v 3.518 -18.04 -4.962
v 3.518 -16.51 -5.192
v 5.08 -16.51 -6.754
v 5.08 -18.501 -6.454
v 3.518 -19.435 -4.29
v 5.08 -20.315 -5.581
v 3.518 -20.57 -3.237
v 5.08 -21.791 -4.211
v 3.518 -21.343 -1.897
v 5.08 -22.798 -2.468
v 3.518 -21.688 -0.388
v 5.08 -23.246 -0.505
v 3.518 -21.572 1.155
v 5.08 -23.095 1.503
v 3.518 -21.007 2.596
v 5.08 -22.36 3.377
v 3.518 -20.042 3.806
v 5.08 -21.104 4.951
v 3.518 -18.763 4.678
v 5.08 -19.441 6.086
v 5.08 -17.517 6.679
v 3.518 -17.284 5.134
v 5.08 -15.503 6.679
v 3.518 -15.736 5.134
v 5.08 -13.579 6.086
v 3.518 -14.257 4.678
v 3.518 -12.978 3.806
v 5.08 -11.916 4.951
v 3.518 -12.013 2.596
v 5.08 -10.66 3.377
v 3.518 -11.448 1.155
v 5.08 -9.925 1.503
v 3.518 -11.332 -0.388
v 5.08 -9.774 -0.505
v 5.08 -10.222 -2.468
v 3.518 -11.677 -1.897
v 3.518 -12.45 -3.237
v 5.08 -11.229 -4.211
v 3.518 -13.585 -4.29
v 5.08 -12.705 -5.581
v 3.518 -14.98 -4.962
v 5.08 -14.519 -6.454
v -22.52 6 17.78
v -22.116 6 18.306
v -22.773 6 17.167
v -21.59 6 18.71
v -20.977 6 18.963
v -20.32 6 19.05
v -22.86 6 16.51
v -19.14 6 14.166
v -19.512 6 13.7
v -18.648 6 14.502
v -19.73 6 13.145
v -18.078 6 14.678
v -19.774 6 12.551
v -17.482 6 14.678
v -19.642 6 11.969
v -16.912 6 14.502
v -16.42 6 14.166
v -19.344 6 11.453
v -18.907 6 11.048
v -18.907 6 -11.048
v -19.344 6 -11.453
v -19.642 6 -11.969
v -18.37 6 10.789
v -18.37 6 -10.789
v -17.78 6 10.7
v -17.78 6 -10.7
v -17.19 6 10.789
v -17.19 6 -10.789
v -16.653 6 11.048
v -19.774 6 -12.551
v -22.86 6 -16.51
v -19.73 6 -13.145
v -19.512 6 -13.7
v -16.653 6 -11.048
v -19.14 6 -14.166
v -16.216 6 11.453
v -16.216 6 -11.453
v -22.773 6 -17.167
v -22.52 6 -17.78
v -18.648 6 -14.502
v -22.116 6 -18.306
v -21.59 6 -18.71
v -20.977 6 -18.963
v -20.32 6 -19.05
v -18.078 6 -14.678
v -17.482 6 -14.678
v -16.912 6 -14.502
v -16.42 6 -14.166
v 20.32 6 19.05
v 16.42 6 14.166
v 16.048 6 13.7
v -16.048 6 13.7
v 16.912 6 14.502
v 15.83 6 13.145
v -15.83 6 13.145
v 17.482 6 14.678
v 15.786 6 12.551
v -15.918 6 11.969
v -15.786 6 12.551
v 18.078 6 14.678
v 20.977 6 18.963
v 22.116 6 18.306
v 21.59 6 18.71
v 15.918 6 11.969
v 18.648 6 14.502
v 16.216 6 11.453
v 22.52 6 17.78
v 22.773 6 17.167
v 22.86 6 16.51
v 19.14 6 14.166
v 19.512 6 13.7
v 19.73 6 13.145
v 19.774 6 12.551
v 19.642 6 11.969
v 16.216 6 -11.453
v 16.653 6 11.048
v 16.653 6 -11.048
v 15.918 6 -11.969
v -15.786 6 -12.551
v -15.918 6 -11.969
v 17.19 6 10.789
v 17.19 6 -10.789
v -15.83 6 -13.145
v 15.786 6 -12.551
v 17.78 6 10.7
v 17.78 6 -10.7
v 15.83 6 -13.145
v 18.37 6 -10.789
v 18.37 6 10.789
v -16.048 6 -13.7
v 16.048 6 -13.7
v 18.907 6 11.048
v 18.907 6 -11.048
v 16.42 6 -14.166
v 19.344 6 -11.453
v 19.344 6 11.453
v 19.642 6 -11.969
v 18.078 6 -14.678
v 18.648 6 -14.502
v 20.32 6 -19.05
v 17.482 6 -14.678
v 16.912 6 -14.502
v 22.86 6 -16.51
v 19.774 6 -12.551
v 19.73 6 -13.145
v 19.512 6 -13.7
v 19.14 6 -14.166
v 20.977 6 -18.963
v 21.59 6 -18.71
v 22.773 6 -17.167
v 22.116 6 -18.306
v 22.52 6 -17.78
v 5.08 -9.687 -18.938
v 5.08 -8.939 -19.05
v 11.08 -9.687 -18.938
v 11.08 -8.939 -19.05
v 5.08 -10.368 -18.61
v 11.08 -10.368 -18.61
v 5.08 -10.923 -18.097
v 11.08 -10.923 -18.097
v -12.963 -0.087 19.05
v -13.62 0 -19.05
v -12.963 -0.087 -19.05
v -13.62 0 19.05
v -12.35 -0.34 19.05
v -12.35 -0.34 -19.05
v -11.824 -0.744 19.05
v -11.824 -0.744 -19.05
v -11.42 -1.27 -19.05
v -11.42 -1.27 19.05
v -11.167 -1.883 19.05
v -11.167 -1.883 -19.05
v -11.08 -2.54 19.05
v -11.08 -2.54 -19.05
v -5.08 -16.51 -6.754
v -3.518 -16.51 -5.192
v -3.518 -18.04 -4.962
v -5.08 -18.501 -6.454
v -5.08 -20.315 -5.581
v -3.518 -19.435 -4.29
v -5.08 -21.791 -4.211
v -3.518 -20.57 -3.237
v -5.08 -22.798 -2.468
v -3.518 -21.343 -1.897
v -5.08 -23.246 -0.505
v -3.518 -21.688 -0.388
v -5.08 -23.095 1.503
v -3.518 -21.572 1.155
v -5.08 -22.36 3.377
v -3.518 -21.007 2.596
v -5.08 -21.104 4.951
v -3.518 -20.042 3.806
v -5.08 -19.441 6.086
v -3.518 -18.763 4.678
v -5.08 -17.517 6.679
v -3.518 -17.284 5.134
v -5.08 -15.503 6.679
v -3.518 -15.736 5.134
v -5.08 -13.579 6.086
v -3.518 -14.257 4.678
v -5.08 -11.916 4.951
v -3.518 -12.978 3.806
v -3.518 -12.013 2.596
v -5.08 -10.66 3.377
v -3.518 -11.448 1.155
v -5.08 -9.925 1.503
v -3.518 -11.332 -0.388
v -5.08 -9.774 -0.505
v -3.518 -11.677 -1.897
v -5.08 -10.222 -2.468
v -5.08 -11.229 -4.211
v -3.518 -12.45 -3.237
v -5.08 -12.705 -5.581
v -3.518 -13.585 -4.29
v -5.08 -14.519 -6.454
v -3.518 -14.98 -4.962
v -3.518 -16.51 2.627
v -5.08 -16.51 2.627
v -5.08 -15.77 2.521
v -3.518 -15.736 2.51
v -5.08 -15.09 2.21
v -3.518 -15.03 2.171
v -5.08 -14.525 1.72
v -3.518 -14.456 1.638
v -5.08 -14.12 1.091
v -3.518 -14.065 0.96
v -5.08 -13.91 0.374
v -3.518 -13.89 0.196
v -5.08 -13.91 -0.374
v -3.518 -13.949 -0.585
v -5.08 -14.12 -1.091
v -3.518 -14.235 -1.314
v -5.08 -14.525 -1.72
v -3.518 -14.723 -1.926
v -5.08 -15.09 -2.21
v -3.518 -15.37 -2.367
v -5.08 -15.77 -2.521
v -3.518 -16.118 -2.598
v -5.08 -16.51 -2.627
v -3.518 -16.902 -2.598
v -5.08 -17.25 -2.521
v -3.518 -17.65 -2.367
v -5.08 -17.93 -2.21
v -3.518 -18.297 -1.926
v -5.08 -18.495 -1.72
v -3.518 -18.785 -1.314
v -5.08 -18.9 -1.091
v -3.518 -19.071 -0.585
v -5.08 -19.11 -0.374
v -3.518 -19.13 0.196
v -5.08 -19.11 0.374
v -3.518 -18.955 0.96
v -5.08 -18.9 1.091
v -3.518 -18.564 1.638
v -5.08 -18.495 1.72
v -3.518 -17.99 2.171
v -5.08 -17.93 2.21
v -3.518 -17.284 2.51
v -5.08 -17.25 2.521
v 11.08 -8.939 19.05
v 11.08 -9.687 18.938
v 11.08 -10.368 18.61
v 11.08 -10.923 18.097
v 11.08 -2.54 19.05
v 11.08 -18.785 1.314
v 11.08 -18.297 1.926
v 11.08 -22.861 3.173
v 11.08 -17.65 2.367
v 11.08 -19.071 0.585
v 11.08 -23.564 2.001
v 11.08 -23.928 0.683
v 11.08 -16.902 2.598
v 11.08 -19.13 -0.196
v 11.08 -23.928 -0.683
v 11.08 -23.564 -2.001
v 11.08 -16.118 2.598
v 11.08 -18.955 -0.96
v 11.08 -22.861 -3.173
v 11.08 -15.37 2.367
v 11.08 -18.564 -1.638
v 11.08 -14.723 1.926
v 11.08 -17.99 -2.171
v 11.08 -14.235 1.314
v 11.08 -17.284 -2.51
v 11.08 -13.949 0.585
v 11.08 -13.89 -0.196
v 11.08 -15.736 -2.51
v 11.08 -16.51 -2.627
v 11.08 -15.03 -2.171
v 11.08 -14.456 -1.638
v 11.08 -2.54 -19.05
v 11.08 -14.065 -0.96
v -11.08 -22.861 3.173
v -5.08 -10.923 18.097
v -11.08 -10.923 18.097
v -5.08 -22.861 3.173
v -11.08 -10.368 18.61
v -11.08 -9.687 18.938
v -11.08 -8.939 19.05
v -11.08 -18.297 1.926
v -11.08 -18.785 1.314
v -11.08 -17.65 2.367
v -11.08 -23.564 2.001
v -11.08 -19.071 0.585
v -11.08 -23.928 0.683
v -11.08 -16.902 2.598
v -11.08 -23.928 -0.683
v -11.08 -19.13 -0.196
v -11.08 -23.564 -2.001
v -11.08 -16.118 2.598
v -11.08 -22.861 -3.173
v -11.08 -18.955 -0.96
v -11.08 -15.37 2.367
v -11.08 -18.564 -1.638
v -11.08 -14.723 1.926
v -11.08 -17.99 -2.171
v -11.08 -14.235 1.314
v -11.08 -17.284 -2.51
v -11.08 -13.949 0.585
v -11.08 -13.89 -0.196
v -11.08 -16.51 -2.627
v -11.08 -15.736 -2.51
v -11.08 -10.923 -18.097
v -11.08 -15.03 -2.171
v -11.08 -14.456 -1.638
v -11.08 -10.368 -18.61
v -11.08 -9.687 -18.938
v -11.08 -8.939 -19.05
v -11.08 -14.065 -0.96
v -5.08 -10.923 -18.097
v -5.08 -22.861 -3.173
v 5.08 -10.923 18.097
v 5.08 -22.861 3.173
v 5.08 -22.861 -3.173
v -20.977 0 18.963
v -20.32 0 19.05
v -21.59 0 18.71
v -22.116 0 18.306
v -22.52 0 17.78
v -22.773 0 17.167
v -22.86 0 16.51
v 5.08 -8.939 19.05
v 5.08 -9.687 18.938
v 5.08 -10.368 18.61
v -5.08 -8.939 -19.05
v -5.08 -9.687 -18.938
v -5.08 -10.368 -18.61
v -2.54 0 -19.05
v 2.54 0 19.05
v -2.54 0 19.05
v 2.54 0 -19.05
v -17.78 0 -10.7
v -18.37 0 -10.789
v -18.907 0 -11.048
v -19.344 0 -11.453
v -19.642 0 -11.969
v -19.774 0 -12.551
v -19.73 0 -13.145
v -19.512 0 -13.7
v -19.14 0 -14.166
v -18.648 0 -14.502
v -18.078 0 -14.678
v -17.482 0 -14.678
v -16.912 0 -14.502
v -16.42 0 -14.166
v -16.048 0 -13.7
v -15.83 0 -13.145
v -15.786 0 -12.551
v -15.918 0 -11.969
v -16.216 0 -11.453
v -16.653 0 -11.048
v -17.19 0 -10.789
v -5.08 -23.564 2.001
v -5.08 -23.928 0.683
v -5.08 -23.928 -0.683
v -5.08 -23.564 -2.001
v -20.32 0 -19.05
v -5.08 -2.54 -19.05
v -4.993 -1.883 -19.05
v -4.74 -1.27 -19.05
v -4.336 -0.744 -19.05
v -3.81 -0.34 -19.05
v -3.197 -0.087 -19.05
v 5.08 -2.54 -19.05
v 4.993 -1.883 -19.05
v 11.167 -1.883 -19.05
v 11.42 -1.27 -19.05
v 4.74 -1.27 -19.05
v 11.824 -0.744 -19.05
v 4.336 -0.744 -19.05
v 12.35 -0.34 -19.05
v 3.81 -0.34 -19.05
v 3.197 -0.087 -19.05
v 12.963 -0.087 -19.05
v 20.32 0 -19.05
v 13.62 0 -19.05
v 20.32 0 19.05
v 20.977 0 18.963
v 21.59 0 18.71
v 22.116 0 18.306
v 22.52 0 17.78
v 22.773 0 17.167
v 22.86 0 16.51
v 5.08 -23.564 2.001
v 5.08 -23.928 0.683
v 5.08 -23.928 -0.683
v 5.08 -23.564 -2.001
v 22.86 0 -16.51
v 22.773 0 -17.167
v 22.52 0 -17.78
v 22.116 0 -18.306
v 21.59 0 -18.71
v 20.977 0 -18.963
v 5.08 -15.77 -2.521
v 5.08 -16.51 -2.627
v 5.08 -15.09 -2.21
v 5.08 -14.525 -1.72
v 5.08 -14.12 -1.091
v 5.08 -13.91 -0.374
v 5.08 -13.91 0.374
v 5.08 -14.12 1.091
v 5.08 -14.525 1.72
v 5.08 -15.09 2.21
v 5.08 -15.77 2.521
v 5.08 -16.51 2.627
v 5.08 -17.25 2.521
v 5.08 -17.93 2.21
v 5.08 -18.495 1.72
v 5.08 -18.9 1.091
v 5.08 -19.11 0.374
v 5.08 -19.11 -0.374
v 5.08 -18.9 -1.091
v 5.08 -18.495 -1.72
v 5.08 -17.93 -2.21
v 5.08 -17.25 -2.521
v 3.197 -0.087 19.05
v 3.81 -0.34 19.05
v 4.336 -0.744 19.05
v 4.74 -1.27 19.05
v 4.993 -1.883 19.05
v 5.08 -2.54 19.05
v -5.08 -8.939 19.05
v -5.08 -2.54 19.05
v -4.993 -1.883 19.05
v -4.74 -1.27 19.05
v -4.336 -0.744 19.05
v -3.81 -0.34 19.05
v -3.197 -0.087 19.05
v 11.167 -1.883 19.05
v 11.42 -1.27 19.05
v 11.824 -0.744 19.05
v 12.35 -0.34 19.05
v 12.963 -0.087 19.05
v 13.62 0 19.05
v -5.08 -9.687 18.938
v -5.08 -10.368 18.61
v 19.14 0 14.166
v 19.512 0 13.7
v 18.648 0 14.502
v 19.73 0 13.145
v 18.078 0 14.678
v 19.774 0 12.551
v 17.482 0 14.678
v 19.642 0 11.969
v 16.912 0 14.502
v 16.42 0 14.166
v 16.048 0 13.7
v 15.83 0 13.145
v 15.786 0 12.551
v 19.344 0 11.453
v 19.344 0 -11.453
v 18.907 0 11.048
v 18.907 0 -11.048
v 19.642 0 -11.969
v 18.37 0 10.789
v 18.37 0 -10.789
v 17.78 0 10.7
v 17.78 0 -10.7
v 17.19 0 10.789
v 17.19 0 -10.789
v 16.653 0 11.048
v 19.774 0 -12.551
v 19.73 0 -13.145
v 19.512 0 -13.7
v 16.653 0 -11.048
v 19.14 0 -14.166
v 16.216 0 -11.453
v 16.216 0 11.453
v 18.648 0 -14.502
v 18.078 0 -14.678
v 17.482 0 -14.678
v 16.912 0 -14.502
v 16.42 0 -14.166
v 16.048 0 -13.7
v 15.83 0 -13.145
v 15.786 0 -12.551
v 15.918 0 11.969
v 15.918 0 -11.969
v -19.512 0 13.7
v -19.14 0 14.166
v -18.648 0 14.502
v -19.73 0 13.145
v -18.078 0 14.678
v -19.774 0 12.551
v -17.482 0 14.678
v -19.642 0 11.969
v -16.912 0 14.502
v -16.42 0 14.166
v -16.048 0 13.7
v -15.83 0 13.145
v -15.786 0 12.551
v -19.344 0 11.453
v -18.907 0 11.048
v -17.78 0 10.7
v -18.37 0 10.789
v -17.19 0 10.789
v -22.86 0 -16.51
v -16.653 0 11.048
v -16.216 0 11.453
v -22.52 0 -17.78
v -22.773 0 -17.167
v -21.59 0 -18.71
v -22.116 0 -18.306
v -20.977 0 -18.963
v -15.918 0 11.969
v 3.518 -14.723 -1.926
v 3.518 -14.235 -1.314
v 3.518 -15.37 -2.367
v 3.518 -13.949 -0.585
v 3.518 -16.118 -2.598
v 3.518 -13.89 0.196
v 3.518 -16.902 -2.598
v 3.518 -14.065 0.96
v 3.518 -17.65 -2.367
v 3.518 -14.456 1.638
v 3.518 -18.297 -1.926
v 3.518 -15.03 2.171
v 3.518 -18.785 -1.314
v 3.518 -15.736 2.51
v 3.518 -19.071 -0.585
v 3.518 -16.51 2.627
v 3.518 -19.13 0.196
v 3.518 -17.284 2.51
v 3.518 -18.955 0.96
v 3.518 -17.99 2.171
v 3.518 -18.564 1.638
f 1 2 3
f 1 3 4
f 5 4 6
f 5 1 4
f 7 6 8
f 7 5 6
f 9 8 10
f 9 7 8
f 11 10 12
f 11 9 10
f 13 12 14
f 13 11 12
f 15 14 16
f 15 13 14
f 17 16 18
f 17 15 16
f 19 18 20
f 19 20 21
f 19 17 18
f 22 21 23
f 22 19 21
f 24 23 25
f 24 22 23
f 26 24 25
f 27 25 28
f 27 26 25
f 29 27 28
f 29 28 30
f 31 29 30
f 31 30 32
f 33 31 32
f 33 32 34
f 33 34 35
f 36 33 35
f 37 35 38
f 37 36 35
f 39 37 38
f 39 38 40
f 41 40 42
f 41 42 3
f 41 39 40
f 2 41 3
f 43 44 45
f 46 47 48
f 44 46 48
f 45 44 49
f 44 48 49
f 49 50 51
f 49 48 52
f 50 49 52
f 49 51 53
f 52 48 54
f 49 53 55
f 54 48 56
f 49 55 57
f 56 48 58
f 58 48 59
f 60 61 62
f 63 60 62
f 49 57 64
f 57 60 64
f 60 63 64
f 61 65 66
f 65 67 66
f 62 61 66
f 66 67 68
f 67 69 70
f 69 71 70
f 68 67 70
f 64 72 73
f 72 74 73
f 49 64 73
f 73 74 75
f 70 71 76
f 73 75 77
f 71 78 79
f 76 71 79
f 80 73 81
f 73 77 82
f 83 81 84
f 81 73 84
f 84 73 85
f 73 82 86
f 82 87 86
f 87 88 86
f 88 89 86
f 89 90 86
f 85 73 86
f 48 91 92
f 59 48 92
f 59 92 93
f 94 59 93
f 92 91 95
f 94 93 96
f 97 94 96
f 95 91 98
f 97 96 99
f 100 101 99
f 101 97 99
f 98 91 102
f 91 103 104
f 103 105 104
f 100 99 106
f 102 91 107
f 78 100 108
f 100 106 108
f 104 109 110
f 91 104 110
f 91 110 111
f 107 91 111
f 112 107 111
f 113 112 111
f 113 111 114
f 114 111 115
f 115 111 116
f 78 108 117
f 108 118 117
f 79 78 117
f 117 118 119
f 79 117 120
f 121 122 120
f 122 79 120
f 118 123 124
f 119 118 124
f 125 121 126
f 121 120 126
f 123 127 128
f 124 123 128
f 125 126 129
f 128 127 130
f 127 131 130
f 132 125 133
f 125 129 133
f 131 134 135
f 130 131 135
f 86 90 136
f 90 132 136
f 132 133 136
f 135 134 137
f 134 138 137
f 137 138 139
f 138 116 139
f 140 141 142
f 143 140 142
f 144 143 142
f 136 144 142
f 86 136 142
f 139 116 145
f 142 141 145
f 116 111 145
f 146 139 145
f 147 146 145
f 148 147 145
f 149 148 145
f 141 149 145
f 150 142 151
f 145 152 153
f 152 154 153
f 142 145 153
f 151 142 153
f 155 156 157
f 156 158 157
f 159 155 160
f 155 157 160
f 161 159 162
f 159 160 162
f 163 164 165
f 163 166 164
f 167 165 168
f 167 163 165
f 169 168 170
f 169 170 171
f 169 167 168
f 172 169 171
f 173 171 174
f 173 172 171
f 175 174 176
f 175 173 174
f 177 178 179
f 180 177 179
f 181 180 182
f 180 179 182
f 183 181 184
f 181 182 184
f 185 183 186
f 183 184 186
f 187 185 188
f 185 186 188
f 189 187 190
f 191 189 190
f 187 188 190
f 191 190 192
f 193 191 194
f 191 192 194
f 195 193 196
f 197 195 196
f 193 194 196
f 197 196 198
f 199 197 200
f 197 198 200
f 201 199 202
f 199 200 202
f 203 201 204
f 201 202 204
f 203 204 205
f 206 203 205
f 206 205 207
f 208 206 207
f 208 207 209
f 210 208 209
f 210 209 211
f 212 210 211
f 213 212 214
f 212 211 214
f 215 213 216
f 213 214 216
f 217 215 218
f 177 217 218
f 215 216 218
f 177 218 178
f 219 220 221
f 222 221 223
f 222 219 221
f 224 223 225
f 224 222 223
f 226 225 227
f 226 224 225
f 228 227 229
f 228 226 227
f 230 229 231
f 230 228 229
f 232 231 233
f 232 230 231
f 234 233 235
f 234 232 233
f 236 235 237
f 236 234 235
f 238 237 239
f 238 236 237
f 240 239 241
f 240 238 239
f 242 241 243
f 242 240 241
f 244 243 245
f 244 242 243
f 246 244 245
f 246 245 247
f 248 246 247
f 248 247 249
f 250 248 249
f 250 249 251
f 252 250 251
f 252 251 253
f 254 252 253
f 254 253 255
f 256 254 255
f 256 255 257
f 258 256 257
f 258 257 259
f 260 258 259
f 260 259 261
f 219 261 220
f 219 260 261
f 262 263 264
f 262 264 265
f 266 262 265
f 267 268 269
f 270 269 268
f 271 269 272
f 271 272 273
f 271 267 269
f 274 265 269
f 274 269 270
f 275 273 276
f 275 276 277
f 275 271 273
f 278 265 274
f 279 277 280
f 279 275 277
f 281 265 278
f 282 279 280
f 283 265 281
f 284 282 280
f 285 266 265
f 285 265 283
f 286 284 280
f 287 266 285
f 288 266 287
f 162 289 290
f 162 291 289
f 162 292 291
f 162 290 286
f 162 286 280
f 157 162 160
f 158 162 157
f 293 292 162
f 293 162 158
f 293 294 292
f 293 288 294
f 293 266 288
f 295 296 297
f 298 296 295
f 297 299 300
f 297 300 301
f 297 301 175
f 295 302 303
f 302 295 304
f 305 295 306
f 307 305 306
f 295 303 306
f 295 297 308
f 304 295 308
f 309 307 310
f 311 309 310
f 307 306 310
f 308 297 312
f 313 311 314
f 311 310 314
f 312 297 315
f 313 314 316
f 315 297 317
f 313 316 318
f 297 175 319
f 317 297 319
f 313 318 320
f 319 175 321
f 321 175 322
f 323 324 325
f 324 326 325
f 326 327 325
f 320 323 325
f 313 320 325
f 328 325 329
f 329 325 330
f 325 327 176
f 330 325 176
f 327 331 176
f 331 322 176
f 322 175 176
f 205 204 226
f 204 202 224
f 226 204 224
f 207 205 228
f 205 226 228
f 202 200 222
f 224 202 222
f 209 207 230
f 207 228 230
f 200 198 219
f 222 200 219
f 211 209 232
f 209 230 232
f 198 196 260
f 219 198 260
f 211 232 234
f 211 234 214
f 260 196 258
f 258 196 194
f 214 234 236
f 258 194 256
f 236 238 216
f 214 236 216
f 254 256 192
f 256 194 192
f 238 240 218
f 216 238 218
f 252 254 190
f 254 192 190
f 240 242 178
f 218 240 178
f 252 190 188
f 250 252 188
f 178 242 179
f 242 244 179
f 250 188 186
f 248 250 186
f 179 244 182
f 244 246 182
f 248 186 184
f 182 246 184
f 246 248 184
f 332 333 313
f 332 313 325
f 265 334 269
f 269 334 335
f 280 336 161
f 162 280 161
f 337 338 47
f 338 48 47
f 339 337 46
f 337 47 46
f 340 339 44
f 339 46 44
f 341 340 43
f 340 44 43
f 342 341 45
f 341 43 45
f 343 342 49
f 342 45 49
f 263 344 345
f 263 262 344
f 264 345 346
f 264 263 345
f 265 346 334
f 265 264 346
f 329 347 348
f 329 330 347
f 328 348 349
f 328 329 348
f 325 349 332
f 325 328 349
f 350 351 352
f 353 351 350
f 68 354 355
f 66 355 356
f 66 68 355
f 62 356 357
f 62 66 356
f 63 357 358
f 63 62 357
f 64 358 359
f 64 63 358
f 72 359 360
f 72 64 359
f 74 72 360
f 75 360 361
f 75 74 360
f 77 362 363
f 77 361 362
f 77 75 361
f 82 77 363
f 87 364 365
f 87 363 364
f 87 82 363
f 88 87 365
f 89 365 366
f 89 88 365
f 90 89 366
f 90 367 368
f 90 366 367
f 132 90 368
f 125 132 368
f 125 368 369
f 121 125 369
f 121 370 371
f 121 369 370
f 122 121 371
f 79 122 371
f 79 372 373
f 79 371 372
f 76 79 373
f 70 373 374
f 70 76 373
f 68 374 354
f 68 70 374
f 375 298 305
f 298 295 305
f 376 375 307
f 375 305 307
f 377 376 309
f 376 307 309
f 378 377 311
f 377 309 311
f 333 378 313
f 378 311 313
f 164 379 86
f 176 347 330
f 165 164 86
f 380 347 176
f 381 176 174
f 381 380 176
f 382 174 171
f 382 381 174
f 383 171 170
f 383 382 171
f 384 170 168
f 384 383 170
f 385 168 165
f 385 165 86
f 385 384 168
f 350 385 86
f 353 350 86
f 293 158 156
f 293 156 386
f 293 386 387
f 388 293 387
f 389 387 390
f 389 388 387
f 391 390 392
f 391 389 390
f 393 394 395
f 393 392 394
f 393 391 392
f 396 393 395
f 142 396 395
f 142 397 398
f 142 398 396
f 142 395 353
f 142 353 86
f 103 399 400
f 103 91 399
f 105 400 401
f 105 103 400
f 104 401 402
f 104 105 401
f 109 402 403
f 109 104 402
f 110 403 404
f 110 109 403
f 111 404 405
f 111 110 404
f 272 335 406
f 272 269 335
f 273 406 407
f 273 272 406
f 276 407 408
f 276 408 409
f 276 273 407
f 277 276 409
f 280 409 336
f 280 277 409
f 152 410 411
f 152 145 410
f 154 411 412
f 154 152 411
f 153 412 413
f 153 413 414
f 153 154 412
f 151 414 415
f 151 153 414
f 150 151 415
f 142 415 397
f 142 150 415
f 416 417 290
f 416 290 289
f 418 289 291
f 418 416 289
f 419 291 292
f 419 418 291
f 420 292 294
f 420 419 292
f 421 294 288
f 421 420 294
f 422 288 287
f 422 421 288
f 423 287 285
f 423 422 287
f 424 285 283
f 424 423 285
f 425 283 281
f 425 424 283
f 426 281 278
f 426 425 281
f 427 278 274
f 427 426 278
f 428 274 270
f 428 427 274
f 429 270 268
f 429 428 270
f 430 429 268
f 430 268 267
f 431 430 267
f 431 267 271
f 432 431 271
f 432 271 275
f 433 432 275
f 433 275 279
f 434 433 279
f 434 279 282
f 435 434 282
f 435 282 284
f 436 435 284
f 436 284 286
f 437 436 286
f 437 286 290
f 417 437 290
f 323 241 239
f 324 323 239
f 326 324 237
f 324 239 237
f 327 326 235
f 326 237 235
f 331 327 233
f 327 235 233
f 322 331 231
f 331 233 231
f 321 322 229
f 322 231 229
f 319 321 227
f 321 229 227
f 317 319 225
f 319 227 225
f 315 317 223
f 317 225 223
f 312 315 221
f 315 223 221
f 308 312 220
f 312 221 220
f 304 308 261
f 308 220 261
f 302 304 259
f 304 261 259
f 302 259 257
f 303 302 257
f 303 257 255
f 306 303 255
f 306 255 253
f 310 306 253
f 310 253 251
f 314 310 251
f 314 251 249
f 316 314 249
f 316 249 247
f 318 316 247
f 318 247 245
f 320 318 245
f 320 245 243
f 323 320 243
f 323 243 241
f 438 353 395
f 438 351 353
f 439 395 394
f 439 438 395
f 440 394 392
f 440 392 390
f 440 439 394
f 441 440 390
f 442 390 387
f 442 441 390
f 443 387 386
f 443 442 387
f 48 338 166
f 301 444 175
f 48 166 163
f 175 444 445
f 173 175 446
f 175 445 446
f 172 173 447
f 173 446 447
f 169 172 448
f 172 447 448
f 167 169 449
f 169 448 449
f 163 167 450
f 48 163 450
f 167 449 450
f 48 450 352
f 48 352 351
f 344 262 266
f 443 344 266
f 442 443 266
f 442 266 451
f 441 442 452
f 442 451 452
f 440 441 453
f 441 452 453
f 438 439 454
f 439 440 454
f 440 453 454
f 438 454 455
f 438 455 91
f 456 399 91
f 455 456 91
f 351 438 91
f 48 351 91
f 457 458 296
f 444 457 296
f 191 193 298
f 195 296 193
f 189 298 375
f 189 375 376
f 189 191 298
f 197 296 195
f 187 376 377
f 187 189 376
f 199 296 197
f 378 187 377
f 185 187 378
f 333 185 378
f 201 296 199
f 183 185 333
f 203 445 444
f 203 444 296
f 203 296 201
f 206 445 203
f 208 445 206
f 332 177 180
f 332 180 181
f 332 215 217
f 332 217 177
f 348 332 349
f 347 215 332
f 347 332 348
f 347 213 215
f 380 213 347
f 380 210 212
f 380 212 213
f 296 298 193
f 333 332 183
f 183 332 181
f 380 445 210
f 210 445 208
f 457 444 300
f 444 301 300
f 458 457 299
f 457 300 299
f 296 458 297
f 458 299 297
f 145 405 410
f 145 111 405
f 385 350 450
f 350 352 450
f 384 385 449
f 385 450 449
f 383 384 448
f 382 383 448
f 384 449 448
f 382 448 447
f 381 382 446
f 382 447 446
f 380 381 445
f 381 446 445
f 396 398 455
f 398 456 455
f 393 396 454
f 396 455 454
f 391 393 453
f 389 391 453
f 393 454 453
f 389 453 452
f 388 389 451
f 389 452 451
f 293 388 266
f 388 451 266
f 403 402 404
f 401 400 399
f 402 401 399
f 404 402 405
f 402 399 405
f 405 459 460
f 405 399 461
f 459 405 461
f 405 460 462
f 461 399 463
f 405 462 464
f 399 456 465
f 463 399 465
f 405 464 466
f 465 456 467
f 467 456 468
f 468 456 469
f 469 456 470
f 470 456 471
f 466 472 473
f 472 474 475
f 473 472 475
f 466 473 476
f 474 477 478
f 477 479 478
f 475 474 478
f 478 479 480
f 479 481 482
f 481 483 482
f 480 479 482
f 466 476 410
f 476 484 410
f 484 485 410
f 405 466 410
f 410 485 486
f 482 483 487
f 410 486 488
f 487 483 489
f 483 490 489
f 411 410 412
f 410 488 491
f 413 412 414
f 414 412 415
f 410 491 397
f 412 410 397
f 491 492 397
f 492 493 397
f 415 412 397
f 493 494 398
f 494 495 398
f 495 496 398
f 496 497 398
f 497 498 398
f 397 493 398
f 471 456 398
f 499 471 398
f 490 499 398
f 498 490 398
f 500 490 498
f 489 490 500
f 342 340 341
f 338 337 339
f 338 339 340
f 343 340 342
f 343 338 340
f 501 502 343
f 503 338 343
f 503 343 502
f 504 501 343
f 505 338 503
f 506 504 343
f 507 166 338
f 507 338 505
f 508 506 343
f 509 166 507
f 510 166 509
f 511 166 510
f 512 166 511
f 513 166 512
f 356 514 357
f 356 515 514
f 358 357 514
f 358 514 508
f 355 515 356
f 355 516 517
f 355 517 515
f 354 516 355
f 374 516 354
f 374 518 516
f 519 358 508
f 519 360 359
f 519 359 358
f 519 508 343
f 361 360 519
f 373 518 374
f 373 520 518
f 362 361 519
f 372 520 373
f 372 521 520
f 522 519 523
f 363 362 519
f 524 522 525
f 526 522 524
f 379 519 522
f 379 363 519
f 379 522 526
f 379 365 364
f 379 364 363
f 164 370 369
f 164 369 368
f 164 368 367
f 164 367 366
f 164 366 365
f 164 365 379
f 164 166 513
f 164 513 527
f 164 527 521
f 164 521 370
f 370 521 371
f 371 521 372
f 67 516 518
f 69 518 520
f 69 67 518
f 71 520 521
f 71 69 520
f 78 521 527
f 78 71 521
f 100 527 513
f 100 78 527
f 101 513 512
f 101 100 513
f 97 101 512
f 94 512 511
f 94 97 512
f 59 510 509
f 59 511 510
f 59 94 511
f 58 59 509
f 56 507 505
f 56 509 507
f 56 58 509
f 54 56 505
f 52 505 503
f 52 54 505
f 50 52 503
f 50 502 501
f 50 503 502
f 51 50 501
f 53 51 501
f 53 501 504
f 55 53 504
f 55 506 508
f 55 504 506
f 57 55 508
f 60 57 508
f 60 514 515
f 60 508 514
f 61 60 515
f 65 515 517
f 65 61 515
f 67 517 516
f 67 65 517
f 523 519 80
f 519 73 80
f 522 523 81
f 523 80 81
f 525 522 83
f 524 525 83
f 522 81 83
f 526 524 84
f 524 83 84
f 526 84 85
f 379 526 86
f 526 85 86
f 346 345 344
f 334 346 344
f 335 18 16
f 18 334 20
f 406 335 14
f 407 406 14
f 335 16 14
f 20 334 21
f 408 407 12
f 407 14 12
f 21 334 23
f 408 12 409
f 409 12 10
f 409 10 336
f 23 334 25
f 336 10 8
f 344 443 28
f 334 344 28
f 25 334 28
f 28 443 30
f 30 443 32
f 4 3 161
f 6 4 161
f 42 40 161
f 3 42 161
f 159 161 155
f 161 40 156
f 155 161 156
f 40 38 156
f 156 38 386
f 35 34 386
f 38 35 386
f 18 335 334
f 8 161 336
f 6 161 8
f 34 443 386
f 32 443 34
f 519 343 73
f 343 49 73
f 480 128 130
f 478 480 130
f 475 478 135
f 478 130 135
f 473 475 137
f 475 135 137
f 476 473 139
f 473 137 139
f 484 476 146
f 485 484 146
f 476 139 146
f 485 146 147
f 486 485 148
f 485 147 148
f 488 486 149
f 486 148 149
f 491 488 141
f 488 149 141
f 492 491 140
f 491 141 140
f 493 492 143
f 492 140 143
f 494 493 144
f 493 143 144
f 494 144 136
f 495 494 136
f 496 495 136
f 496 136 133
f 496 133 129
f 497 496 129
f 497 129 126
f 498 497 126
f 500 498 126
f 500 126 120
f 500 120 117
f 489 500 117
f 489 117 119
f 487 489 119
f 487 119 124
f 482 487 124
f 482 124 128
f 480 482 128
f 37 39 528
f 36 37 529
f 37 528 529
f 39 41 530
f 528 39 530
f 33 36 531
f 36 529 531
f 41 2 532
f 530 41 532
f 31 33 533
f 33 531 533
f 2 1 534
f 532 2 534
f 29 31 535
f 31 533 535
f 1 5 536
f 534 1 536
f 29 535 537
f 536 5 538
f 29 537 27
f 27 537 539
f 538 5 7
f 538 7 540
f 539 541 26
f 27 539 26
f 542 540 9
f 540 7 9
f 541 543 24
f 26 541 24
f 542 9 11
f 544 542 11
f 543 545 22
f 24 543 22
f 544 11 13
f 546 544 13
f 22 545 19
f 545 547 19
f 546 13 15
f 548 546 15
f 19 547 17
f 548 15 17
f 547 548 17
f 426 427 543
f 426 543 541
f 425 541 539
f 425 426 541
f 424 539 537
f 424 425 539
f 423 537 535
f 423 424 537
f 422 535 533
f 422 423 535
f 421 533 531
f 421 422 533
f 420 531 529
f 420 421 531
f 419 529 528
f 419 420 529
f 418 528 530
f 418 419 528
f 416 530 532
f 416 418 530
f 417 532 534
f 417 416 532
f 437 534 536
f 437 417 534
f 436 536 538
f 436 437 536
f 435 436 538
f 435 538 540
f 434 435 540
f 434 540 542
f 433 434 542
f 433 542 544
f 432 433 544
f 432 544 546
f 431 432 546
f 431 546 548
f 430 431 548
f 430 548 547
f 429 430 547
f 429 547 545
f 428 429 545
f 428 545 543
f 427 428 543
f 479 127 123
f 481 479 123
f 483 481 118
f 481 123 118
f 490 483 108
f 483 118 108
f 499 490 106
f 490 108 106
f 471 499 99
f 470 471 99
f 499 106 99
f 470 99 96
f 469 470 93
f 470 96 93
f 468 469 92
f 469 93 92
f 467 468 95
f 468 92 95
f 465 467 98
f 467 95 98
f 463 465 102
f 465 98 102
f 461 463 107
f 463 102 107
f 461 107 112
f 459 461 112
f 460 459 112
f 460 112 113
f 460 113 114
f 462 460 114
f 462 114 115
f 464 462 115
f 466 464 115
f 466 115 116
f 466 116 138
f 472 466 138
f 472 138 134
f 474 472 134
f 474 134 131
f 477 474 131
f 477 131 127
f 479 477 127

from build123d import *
from OCP.BRepFilletAPI import BRepFilletAPI_MakeFillet

# Parameters (mm, degrees)
SKETCH1_R           = 2.627
BOSS_EXTRUDE1_DEPTH = 6
BOSS_EXTRUDE2_START = -5.08
SKETCH1_3_W         = 38.1
SKETCH1_3_H         = 5.999999938
BOSS_EXTRUDE2_DEPTH = 22.86
SKETCH3_R           = 2.000000064
CUT_EXTRUDE1_DEPTH  = 44.260167546
FILLET1_R1          = 2.54
FILLET1_R2          = 5.08
SKETCH4_R           = 4.2145
SKETCH4_R_2         = 2.627
BOSS_EXTRUDE3_DEPTH = 1.5621
BOSS_EXTRUDE4_START = 8.5979
SKETCH4_2_R         = 4.2145
SKETCH4_2_R_2       = 2.627
BOSS_EXTRUDE4_DEPTH = 1.5621
CHAMFER2_SIZE       = 2.54


with BuildPart() as part:
    # Sketch1 → Boss-Extrude1 (new body)
    with BuildSketch(Plane(origin=(5.08, 0, 0), x_dir=(0, 0, -1), z_dir=(1, 0, 0))):
        Polygon((-19.05, 0), (-19.05, -10.16), (0, -25.4), (19.05, -10.16), (19.05, 0), align=None)
        with Locations((0, -16.51)):
            Circle(SKETCH1_R, mode=Mode.SUBTRACT)
    boss_extrude1 = extrude(amount=BOSS_EXTRUDE1_DEPTH)

    # Sketch1<3> → Boss-Extrude2 (add)
    with BuildSketch(Plane(origin=(5.08, 0, 0), x_dir=(0, 0, -1), z_dir=(1, 0, 0)).offset(BOSS_EXTRUDE2_START)):
        with Locations((0, 2.999999969)):
            Rectangle(SKETCH1_3_W, SKETCH1_3_H)
    boss_extrude2 = extrude(amount=BOSS_EXTRUDE2_DEPTH)

    # Sketch3 → Cut-Extrude1 (cut, through all)
    with BuildSketch(Plane(origin=(0, 5.999999938, 0), x_dir=(1, 0, 0), z_dir=(0, 1, 0))):
        with Locations(Location((17.78, 12.7, 0), (0, 0, 270))):
            Circle(SKETCH3_R)
        with Locations(Location((17.78, -12.7, 0), (0, 0, 90))):
            Circle(SKETCH3_R)
    cut_extrude1 = extrude(amount=-CUT_EXTRUDE1_DEPTH, mode=Mode.SUBTRACT)

    # Mirror2: Boss-Extrude2, Cut-Extrude1 across plane
    add(boss_extrude2.mirror(Plane(origin=(0, 0, 0), x_dir=(0, 0, 1), z_dir=(1, 0, 0))))
    add(cut_extrude1.mirror(Plane(origin=(0, 0, 0), x_dir=(0, 0, 1), z_dir=(1, 0, 0))), mode=Mode.SUBTRACT)

    # Mirror3: Boss-Extrude1 across plane
    add(boss_extrude1.mirror(Plane(origin=(0, 0, 0), x_dir=(0, 0, 1), z_dir=(1, 0, 0))))

    # Fillet1: one fillet with a radius per group of edges: ONE call of the kernel's fillet builder (fillet() takes one radius for all edges)
    fillet1_edges_1 = [part.edges().sort_by_distance(p)[0] for p in [
        (8.08, -10.16, 19.05),
        (8.08, -10.16, -19.05),
        (11.08, 0, 0),
        (22.86, 2.999999969, 19.05),
        (22.86, 2.999999969, -19.05),
        (-22.86, 2.999999969, -19.05),
        (-22.86, 2.999999969, 19.05),
        (-8.08, -10.16, -19.05),
        (-8.08, -10.16, 19.05),
        (-5.08, 0, 0),
        (-11.08, 0, 0),
        (5.08, 0, 0),
    ]]
    fillet1_edges_2 = [part.edges().sort_by_distance(p)[0] for p in [
        (8.08, -25.4, 0),
        (-8.08, -25.4, 0),
    ]]
    fillet1 = BRepFilletAPI_MakeFillet(part.part.solid().wrapped)
    for e in fillet1_edges_1:
        fillet1.Add(FILLET1_R1, e.wrapped)
    for e in fillet1_edges_2:
        fillet1.Add(FILLET1_R2, e.wrapped)
    add(Compound.cast(fillet1.Shape()), mode=Mode.REPLACE)

    # Sketch4 → Boss-Extrude3 (add)
    with BuildSketch(Plane.ZY.offset(-5.08)):
        with Locations(Location((0, -16.51, 0), (0, 0, 180))):
            Circle(SKETCH4_R)
        with Locations((0, -16.51)):
            Circle(SKETCH4_R_2, mode=Mode.SUBTRACT)
    extrude(amount=BOSS_EXTRUDE3_DEPTH)

    # Sketch4<2> → Boss-Extrude4 (add)
    with BuildSketch(Plane.ZY.offset(-5.08).offset(BOSS_EXTRUDE4_START)):
        with Locations(Location((0, -16.51, 0), (0, 0, 180))):
            Circle(SKETCH4_2_R)
        with Locations((0, -16.51)):
            Circle(SKETCH4_2_R_2, mode=Mode.SUBTRACT)
    extrude(amount=BOSS_EXTRUDE4_DEPTH)

    # Chamfer2
    # the kernel refuses this chamfer: 2.54 mm, written as the material it adds along each edge
    with BuildSketch(Plane(origin=(5.08, -16.51, 0), x_dir=(0, 0, -1), z_dir=(0, 1, 0))) as chamfer2_piece_1_section:
        Polygon((4.2145 + CHAMFER2_SIZE, 0), (4.2145, CHAMFER2_SIZE), (4.2145, 0), align=None)
    chamfer2_piece_1 = revolve(axis=Axis((5.08, -16.51, 0), (-1, 0, 0)), mode=Mode.PRIVATE)
    chamfer2_piece_1 = split(chamfer2_piece_1, bisect_by=Plane(origin=(3.5179, -16.51, 5.976913078), z_dir=(1, 0, 0)), keep=Keep.TOP, mode=Mode.PRIVATE)
    add(chamfer2_piece_1)
    with BuildSketch(Plane(origin=(-5.08, -16.51, 0), x_dir=(0, 0, -1), z_dir=(0, 1, 0))) as chamfer2_piece_2_section:
        Polygon((4.2145 + CHAMFER2_SIZE, 0), (4.2145, -CHAMFER2_SIZE), (4.2145, 0), align=None)
    chamfer2_piece_2 = revolve(axis=Axis((-5.08, -16.51, 0), (-1, 0, 0)), mode=Mode.PRIVATE)
    chamfer2_piece_2 = split(chamfer2_piece_2, bisect_by=Plane(origin=(-3.5179, -16.51, 5.976913078), z_dir=(-1, 0, 0)), keep=Keep.TOP, mode=Mode.PRIVATE)
    add(chamfer2_piece_2)


solid = part.part
